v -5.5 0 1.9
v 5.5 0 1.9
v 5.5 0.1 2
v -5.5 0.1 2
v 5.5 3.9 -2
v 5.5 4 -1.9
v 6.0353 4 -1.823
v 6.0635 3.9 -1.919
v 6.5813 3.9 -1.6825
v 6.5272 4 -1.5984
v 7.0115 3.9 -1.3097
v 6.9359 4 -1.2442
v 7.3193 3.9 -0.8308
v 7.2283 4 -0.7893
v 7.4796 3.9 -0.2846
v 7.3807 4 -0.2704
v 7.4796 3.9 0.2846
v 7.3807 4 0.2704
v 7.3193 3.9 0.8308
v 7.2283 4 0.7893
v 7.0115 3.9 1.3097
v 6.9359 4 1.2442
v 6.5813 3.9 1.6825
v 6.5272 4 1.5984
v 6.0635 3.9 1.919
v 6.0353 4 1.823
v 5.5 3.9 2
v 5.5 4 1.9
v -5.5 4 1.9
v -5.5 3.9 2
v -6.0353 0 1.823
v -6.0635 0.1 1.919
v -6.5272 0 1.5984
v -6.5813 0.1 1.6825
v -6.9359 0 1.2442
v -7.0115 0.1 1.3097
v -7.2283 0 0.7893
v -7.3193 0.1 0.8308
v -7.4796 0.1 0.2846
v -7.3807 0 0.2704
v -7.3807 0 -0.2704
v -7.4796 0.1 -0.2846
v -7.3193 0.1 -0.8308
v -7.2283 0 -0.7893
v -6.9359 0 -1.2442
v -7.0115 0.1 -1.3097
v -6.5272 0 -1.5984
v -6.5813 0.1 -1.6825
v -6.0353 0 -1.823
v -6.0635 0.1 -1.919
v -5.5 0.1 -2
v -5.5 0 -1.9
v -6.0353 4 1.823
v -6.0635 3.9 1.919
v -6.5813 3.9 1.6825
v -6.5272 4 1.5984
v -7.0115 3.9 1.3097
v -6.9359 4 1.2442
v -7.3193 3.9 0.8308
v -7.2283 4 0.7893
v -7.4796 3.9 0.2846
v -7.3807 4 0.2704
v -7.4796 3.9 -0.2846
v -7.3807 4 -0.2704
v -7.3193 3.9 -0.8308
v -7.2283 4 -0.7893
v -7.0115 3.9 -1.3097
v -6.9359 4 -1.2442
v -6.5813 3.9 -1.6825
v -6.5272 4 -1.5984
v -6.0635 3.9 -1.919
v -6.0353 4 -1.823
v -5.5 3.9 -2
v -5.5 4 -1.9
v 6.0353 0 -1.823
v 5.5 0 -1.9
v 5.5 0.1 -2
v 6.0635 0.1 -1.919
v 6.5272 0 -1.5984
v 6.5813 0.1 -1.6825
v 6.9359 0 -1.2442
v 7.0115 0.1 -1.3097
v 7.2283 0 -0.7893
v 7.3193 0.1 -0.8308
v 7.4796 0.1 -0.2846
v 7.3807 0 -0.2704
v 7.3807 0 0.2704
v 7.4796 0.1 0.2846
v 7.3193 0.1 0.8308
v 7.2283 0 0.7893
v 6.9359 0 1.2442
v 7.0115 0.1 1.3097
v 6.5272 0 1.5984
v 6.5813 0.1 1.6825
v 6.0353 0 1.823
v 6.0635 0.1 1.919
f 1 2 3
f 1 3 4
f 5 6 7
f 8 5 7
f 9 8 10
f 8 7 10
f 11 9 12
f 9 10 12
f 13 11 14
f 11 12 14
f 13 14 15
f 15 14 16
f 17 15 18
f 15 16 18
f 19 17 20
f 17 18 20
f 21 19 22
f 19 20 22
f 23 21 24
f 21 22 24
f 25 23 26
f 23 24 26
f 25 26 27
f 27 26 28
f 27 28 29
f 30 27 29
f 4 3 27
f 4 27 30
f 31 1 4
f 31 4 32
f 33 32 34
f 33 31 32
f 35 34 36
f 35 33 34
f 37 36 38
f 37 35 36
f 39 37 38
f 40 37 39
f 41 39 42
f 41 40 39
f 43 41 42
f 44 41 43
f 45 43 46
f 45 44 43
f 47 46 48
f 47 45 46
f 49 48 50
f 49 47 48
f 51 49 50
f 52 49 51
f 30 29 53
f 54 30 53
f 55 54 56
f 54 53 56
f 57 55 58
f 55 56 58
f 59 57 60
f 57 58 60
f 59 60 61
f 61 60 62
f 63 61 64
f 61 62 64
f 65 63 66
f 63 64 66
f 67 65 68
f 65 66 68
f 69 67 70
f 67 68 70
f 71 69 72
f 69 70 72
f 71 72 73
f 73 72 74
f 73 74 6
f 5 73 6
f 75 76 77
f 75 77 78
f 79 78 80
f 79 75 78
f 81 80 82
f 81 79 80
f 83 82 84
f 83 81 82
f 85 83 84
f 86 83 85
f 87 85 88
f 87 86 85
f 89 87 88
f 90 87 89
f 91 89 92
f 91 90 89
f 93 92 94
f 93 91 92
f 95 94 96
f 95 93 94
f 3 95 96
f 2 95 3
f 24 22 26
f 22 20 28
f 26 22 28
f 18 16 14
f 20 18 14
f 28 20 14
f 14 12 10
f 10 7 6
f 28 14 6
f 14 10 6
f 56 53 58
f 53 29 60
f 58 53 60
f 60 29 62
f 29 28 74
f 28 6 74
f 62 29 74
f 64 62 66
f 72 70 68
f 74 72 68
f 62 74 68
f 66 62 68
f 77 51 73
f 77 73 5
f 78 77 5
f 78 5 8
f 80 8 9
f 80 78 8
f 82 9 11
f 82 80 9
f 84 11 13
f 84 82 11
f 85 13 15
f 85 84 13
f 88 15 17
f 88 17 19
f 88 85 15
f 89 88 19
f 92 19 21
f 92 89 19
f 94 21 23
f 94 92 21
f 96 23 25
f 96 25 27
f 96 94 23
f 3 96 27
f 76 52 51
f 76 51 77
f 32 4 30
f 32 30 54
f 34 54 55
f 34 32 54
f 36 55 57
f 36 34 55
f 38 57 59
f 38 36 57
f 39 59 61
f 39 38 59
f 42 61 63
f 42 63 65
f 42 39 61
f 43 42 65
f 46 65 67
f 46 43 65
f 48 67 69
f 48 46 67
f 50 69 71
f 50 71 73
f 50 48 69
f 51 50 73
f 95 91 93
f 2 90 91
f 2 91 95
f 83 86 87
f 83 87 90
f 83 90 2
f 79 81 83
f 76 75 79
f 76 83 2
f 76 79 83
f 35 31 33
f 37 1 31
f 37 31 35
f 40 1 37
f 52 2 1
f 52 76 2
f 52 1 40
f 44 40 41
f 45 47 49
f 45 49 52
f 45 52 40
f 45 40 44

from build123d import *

# Parameters (mm, degrees)
BOSS_EXTRU_1_DEPTH = 4
CHANFREIN1_SIZE    = 0.1


with BuildPart() as part:
    # Esquisse1 → Boss.-Extru.1 (new body)
    with BuildSketch(Plane(origin=(0, 0, 0), x_dir=(1, 0, 0), z_dir=(0, 1, 0))):
        with BuildLine():
            Line((-5.5, 2), (5.5, 2))
            ThreePointArc((5.5, 2), (7.5, 0), (5.5, -2))
            Line((5.5, -2), (-5.5, -2))
            ThreePointArc((-5.5, -2), (-7.5, 0), (-5.5, 2))
        make_face()
    extrude(amount=BOSS_EXTRU_1_DEPTH)

    # Chanfrein1
    chanfrein1_edges = [part.edges().sort_by_distance(p)[0] for p in [
        (7.5, 4, 0),
        (0, 4, -2),
        (-7.5, 4, 0),
        (0, 0, -2),
        (7.5, 0, 0),
        (0, 0, 2),
        (-7.5, 0, 0),
        (0, 4, 2),
    ]]
    chamfer(chanfrein1_edges, length=CHANFREIN1_SIZE)


solid = part.part
